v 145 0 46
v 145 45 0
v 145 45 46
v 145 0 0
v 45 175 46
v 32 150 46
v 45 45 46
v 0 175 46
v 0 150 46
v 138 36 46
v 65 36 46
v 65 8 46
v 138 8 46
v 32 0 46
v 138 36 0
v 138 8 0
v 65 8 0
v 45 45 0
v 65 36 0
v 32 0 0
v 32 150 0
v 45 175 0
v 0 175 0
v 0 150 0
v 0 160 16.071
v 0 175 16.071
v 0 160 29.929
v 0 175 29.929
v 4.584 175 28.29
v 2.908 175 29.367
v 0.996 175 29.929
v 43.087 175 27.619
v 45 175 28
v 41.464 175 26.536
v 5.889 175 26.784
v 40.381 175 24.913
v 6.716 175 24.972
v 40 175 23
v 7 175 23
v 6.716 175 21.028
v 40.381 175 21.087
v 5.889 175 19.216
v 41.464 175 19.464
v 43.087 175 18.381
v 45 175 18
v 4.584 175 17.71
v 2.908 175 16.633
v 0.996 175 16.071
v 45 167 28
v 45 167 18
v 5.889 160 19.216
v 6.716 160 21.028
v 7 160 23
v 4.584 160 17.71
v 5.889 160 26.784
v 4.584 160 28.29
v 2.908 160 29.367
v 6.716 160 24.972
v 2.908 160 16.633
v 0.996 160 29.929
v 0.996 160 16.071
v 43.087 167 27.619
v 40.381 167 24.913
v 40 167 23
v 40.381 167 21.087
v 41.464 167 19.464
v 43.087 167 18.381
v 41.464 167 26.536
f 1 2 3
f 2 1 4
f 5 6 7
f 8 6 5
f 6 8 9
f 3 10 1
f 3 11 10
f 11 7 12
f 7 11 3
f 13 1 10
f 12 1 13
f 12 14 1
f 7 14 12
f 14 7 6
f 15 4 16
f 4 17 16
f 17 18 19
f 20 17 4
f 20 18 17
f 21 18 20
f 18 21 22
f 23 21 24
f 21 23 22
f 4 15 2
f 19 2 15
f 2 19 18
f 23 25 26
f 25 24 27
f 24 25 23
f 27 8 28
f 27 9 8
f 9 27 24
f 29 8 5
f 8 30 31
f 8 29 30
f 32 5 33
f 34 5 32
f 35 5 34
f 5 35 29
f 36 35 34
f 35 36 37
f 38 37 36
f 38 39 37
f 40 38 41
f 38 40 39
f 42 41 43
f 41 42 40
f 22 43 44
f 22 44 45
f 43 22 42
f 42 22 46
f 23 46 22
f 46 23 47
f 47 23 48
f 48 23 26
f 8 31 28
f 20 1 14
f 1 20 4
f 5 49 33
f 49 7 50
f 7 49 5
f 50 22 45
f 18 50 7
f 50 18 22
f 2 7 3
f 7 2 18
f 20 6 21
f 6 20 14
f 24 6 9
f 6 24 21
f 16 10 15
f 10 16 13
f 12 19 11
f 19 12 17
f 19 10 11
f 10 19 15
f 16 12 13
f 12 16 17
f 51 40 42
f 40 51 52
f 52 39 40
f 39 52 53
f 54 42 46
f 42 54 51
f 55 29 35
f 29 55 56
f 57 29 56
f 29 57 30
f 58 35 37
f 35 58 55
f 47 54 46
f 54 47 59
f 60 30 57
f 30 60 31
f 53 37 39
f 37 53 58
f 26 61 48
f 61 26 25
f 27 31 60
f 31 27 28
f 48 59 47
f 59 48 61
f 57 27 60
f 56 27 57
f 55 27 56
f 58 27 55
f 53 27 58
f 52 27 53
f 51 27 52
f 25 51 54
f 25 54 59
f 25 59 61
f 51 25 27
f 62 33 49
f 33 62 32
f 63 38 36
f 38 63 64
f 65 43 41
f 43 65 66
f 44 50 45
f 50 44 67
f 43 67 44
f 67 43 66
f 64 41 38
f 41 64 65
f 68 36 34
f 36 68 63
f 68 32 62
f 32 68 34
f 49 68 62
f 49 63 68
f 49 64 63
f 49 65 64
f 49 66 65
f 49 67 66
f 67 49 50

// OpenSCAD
difference() {
    hoogte = 46;
    
    // Omtrek
    cube([145, 175, 46]);
    
    // Uitsnede rechtsonder
    translate([45, 45, 0]) {
        cube([105, 155, hoogte]);
    }
    
    // Gat boven
    translate([0, 0, 0]) {
        cube([32, 150, hoogte]);
    }
    
    // Gat links
    translate([65, 8, 0]) {
        cube([73, 28, hoogte]);
    }
    
    // Laserdiode
    translate([0, 160, hoogte / 2]) {
        rotate(-90, [1, 0, 0]) {
            cylinder(15, r = 7);
        }
    }
    
    // Photodiode
    translate([45, 167, hoogte / 2]) {
        rotate(-90, [1, 0, 0]) {
            cylinder(8, r = 5);
        }
    }
}
    
